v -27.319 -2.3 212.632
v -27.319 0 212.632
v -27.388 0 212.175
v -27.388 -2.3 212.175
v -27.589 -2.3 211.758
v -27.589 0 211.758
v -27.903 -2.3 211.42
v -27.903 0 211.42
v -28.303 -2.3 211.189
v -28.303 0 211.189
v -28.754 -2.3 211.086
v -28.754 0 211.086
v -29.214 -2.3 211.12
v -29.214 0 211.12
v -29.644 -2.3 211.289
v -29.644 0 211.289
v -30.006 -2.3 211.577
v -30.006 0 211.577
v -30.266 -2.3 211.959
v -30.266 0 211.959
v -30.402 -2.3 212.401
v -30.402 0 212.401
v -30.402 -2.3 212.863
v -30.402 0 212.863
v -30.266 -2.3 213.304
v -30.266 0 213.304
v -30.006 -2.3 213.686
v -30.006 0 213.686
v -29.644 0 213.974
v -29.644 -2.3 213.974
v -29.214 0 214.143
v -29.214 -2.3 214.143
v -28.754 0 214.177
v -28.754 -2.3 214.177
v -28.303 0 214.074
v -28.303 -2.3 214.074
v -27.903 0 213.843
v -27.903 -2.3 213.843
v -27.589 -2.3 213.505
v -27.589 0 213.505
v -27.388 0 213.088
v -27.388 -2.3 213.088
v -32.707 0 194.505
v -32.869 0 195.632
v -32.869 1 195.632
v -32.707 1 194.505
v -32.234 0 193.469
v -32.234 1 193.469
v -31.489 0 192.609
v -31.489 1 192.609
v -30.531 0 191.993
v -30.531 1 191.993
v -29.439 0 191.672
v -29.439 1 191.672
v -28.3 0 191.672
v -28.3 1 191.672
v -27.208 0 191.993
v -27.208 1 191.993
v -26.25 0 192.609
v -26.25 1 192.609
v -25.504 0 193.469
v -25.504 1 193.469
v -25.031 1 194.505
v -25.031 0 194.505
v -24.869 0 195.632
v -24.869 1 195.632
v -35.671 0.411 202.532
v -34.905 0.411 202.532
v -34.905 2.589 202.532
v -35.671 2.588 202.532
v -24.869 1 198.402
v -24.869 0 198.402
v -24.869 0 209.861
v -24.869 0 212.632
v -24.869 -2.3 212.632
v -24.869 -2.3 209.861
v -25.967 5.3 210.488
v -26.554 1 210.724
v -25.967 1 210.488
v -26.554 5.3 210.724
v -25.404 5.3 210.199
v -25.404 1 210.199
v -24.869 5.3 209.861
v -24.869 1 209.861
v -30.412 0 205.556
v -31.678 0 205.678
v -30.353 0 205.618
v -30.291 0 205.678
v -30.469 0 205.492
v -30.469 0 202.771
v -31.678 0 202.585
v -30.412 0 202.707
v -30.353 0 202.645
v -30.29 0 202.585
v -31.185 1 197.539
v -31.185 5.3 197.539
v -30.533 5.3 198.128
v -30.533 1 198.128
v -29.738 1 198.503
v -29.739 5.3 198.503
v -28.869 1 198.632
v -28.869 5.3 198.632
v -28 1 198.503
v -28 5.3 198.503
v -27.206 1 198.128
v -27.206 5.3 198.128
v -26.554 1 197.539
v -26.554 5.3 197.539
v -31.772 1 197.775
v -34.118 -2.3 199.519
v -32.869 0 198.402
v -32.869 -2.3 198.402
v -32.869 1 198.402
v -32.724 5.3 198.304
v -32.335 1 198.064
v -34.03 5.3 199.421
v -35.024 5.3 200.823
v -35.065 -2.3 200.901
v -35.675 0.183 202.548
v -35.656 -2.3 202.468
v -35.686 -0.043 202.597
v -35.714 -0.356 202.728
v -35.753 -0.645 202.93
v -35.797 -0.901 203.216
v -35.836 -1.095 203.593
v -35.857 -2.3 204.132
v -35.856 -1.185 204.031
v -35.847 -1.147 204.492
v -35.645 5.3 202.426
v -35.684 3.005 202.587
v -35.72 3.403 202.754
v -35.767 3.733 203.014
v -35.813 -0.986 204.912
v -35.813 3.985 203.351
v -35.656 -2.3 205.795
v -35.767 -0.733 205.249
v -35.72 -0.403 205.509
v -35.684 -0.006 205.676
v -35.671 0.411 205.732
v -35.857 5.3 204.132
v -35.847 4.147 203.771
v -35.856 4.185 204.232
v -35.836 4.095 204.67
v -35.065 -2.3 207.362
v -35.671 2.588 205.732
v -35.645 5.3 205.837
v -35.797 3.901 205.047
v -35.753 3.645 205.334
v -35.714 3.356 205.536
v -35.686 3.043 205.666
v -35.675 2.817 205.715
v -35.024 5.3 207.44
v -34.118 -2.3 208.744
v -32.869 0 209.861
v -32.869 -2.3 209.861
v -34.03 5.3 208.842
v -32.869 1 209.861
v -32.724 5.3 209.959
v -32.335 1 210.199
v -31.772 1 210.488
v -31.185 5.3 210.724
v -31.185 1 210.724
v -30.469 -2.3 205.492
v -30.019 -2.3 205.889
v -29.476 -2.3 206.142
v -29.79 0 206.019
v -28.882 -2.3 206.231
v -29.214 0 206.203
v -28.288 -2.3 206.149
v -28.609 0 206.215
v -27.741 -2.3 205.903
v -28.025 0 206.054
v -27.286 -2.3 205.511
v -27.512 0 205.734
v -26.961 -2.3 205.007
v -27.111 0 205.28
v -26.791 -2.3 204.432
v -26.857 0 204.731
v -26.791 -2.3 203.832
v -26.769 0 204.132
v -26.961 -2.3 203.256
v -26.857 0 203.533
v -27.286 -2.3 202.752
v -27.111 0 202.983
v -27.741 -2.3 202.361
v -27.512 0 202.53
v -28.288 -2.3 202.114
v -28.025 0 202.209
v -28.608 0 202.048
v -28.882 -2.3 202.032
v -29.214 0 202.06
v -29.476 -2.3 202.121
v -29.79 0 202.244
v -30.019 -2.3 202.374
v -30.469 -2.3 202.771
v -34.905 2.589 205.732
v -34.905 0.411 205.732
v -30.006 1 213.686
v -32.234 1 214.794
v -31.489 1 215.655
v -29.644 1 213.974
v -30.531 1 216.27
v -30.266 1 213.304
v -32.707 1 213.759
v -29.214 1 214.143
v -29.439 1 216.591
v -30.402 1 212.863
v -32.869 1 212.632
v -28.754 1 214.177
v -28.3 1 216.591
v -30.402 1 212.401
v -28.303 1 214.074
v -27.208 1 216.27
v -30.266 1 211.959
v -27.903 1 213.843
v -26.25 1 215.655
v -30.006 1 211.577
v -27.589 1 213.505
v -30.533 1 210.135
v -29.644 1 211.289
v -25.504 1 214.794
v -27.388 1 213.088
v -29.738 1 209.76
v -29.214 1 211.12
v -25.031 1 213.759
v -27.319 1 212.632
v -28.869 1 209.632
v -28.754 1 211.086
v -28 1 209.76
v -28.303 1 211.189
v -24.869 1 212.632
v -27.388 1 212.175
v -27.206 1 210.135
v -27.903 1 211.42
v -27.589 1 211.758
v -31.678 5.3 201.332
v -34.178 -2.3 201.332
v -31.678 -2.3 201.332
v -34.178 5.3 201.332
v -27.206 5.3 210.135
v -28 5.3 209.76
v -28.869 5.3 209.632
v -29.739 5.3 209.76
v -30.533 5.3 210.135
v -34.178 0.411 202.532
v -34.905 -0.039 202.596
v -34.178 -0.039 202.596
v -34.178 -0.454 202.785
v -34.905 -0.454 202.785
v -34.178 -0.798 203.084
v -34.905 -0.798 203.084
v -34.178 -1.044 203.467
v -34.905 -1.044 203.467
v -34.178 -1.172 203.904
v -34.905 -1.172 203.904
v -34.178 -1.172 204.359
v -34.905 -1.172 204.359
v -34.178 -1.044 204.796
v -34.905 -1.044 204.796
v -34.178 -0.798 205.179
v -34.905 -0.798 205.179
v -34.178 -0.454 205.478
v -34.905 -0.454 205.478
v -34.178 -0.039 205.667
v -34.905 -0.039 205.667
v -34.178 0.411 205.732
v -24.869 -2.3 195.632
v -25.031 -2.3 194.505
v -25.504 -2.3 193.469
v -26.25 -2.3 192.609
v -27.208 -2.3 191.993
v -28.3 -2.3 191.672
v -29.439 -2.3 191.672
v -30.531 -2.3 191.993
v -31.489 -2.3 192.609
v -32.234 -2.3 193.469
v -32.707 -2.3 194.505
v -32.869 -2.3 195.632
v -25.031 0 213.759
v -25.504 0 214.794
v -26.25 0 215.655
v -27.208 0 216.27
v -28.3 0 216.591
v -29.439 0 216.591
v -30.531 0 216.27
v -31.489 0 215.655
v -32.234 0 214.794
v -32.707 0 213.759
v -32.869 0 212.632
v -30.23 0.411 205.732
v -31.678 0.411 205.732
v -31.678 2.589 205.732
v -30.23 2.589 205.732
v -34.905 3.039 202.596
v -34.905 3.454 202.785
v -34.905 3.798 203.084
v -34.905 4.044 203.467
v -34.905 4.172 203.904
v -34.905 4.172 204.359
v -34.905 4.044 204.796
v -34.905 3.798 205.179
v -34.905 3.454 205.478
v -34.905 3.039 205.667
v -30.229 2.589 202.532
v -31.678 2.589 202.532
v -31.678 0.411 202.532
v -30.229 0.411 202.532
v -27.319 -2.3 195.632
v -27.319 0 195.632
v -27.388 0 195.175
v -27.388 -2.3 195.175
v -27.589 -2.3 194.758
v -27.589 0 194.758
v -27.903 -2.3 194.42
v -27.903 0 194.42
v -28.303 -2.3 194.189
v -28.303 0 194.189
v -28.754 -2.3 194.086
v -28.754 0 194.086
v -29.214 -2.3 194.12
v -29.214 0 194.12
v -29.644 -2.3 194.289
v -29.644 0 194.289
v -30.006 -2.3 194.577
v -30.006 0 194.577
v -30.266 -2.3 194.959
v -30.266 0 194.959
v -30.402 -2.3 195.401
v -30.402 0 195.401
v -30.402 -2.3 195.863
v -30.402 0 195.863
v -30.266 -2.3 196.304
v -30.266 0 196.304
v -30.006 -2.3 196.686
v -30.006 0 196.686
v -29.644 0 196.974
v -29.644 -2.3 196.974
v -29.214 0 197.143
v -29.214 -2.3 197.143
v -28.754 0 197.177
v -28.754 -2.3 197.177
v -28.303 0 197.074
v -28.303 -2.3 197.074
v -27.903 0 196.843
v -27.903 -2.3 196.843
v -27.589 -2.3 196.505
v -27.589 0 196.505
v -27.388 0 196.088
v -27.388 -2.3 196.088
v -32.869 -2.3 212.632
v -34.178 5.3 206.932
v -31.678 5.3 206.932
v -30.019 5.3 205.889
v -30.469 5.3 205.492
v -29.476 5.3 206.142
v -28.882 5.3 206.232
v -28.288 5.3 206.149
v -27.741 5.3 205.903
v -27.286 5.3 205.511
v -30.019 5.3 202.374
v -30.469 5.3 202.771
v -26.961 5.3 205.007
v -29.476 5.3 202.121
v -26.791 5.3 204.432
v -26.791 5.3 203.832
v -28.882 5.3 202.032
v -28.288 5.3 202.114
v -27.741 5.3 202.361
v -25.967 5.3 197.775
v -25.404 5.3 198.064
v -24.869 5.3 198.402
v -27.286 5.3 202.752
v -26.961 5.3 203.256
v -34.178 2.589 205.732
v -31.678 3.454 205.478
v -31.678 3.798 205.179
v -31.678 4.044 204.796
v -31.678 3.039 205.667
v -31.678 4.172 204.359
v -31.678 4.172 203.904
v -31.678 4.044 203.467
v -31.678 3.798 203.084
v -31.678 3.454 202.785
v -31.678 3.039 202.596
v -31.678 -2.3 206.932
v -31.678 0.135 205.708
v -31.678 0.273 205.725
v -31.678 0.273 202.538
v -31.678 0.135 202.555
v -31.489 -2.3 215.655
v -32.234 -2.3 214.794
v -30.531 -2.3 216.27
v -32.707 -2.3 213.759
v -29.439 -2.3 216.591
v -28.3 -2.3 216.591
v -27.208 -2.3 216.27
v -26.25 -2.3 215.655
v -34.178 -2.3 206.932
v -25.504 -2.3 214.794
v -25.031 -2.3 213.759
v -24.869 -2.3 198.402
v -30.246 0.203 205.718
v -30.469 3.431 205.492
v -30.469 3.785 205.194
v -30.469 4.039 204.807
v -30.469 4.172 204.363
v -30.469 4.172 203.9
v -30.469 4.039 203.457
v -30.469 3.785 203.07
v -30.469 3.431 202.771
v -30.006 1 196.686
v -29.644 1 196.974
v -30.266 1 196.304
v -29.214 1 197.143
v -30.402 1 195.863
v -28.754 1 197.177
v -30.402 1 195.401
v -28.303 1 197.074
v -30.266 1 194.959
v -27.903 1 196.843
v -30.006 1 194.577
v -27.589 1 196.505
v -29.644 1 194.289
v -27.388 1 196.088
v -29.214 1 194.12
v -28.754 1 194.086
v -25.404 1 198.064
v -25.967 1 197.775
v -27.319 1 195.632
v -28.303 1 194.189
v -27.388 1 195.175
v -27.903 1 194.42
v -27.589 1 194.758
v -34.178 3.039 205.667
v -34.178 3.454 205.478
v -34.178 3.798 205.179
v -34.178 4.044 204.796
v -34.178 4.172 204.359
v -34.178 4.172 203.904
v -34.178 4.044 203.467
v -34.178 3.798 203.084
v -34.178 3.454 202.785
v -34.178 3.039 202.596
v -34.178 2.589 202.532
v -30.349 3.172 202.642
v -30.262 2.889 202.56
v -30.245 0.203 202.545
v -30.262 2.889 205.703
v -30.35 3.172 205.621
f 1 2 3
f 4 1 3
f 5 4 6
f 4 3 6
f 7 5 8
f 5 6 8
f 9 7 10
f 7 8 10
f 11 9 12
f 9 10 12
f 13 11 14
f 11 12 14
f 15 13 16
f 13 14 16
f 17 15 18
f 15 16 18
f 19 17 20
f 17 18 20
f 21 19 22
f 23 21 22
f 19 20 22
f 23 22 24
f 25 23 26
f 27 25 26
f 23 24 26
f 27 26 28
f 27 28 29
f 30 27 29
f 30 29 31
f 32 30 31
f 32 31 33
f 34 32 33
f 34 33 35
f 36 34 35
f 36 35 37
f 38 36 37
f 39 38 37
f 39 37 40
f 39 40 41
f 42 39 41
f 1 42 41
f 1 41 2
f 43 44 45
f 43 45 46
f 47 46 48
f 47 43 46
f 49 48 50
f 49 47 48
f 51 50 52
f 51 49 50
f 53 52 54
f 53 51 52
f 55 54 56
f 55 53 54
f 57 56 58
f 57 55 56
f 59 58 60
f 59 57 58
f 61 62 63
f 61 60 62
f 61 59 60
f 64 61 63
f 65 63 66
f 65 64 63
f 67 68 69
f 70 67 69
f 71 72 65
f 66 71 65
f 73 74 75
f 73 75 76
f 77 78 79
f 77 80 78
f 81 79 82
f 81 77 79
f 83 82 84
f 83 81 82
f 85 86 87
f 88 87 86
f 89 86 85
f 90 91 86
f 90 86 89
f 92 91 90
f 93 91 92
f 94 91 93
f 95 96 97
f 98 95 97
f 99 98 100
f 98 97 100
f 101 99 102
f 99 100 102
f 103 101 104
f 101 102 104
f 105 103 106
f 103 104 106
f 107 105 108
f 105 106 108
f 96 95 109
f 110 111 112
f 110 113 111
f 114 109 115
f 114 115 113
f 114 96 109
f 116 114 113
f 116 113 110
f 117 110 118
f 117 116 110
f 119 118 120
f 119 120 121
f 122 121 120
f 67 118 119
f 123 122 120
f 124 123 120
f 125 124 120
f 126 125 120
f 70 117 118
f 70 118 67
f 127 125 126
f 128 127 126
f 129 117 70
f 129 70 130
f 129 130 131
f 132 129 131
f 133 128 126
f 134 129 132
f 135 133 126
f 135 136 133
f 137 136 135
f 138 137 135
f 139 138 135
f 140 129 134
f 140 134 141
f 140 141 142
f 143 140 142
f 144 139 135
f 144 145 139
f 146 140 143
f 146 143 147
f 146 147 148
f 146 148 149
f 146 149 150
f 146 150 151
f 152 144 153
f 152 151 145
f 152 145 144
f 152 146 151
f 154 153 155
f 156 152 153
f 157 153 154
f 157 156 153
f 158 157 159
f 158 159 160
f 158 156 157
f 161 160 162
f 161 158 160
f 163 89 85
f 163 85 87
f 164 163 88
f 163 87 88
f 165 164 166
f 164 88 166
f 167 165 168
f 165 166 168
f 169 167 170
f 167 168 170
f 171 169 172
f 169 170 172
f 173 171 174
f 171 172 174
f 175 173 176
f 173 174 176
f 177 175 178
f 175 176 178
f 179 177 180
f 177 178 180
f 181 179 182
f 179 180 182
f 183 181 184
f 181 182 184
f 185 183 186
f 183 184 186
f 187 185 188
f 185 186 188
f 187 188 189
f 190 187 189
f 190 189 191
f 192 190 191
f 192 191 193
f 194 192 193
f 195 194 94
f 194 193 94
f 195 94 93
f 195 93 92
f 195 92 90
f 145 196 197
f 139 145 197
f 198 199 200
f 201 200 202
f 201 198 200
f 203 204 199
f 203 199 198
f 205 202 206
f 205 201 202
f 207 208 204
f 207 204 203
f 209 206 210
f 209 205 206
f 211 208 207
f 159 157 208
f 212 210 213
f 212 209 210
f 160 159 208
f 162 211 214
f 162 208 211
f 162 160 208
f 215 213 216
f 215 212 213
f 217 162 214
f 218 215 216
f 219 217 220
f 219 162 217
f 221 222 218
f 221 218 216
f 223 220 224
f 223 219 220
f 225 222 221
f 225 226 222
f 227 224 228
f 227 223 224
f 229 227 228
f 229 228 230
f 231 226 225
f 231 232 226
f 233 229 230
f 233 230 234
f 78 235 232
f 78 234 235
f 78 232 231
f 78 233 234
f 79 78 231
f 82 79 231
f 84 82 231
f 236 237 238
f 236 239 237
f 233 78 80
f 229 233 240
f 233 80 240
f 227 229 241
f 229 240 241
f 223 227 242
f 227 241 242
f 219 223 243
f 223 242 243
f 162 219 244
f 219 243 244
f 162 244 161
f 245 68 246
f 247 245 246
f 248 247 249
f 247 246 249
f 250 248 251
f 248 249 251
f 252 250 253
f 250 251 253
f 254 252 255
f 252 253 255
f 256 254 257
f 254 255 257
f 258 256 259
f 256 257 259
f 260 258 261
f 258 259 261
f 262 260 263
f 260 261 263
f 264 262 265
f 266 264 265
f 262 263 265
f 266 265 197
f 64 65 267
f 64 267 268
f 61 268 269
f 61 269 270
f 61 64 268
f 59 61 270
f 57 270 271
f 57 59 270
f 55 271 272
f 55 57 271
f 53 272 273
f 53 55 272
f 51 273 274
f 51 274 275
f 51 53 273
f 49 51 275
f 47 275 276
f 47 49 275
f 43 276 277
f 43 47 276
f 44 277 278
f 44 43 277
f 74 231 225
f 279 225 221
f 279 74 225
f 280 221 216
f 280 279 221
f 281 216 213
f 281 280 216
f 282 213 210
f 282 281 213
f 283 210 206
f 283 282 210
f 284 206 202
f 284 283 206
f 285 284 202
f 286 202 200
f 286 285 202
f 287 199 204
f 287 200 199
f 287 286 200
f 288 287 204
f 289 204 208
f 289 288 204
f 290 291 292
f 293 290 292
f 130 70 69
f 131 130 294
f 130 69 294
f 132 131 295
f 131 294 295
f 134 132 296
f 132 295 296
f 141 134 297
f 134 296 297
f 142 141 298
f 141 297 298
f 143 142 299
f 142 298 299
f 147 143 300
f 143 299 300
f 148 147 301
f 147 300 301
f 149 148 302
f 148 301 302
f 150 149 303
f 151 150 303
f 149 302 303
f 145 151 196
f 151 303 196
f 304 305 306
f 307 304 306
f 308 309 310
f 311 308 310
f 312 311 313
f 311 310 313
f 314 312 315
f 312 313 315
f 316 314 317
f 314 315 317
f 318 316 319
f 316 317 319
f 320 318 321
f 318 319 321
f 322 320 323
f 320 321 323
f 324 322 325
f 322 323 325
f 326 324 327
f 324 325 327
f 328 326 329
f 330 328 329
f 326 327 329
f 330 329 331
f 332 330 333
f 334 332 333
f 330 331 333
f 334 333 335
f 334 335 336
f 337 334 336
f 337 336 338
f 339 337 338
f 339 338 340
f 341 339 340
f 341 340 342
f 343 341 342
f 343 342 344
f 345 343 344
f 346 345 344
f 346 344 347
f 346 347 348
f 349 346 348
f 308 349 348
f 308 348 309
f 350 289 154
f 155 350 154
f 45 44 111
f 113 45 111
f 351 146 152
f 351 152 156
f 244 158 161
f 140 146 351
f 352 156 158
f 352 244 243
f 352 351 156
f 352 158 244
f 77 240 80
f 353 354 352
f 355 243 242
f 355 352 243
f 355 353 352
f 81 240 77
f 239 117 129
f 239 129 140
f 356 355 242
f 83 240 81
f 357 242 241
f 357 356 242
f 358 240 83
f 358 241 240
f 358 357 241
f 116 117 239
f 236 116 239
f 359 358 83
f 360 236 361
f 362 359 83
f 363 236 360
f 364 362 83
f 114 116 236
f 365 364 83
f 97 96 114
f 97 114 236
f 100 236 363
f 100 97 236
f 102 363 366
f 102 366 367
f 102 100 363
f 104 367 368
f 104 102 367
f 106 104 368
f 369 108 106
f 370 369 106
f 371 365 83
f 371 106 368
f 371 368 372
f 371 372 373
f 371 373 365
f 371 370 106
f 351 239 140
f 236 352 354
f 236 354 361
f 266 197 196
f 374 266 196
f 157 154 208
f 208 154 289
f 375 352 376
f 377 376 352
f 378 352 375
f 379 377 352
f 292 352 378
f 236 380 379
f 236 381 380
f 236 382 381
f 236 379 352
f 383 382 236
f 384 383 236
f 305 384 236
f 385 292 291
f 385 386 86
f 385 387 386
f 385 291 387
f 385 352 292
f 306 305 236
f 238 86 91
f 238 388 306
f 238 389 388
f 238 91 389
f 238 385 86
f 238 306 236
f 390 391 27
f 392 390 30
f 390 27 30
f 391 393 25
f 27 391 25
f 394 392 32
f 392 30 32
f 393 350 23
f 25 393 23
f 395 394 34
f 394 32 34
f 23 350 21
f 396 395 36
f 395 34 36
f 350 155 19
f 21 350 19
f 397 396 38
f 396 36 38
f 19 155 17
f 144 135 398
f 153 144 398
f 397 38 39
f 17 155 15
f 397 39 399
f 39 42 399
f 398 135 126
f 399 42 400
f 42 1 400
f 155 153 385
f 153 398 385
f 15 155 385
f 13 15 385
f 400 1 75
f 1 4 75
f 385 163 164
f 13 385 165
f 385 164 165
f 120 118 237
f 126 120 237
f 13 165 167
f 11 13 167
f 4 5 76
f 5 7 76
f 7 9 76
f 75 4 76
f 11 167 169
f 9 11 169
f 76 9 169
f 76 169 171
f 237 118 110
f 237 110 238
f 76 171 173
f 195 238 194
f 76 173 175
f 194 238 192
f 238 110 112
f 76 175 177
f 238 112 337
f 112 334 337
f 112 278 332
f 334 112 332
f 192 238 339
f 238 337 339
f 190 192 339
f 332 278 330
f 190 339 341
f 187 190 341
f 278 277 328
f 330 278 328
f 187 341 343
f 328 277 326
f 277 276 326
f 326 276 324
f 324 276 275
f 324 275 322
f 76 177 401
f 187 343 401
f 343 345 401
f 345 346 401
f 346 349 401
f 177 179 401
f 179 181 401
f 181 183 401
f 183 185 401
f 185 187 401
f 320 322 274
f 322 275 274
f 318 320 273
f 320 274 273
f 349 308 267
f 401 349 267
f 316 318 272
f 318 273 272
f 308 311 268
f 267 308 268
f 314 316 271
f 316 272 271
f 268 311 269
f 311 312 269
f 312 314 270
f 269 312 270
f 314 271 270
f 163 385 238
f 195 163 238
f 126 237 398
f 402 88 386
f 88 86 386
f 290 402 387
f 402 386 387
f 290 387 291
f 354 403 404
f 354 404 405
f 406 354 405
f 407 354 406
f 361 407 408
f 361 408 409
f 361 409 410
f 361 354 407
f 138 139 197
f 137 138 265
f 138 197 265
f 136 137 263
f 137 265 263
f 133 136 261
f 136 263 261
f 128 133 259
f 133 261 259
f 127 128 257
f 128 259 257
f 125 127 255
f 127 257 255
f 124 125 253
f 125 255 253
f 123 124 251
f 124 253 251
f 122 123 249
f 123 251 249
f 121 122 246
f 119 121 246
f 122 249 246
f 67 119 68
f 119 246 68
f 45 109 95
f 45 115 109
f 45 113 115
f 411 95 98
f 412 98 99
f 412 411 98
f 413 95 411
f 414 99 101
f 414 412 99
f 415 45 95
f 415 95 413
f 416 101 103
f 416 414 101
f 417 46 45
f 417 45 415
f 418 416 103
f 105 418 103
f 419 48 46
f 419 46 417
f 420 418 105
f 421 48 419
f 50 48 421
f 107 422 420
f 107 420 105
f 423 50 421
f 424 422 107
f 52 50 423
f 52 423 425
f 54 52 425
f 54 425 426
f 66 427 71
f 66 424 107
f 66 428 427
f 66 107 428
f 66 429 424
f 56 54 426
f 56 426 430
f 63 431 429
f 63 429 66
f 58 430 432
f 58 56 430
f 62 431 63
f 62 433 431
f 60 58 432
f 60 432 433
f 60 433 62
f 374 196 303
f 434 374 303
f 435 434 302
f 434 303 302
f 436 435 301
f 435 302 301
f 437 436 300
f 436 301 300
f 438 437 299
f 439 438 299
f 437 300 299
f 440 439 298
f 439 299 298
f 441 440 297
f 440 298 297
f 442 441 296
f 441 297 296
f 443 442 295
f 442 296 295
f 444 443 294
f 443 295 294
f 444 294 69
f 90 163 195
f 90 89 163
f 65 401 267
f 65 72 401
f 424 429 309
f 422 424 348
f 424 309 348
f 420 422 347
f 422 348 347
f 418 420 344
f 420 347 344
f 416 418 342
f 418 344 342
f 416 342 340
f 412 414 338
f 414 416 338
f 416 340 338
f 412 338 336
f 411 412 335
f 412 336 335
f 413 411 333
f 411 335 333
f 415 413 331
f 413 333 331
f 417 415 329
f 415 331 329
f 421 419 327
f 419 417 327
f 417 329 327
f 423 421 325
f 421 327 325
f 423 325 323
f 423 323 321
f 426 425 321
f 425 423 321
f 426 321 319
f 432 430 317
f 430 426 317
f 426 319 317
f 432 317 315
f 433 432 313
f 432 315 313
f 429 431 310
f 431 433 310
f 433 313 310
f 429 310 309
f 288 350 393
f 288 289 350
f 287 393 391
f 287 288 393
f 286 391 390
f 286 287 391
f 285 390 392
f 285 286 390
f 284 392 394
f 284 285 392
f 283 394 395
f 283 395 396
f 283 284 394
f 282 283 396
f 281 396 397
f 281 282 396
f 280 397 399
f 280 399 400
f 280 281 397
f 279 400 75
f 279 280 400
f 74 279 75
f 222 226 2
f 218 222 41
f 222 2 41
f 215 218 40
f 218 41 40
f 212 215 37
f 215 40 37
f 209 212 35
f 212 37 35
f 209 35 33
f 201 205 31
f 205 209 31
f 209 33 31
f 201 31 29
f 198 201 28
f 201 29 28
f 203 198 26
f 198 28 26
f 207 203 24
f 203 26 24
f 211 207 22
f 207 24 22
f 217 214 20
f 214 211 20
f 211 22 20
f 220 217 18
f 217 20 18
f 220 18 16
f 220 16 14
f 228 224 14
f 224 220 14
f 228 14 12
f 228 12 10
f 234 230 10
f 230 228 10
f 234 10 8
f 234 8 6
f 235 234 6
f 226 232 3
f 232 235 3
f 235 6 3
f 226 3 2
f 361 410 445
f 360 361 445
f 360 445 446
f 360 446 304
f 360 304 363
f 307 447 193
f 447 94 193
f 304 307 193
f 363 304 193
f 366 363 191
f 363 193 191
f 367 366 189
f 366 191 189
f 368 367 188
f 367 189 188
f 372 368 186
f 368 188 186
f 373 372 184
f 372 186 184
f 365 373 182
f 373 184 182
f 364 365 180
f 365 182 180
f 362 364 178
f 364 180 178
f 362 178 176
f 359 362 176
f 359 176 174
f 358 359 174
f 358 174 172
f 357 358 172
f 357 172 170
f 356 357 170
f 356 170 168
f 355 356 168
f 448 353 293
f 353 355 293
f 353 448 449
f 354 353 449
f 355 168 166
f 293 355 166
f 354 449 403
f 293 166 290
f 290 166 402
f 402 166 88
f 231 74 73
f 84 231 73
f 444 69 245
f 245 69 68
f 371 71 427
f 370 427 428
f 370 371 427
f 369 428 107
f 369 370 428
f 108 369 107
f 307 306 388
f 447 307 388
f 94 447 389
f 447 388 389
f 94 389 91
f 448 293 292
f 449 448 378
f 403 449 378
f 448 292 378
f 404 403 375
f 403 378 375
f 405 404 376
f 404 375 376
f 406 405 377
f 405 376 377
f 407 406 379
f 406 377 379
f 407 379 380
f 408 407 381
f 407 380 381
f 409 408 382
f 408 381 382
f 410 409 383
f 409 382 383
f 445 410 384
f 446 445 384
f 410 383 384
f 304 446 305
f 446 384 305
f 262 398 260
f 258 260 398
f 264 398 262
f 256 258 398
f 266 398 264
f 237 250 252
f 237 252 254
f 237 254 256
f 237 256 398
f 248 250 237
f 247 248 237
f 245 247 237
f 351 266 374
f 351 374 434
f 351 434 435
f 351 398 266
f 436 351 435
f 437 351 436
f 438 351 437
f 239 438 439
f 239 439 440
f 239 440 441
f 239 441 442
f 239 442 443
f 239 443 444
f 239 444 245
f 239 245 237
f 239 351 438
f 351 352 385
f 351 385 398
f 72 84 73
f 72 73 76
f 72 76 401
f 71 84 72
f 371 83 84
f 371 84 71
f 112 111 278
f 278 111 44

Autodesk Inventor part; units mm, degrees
ref_plane "YZ Plane" through (0, 0, 0) normal (1, 0, 0) x (0, 1, 0)
ref_plane "XZ Plane" through (0, 0, 0) normal (0, 1, 0) x (-1, 0, 0)
ref_plane "XY Plane" through (0, 0, 0) normal (0, 0, 1) x (1, 0, 0)
sketch "Sketch1" plane through (0, 0, 0) normal (0, 1, 0) x (-1, 0, 0)
  line L0 (31.678, 204.1316) -> (31.678, 201.3316)
  line L1 (31.678, 201.3316) -> (31.678, 206.9316)
  circle A0 centre (28.8694, 204.1316) radius 2.1
  line L2 (26.7694, 204.1316) -> (30.3694, 204.1316)
  line L3 (30.3694, 204.1316) -> (30.3694, 202.6619)
  line L4 (30.3694, 202.6619) -> (30.3694, 205.6012)
  line L5 (30.3694, 204.1316) -> (31.678, 204.1316)
  line L6 (31.678, 201.3316) -> (34.178, 201.3316)
  line L7 (34.178, 201.3316) -> (34.178, 206.9316)
  line L8 (34.178, 206.9316) -> (31.678, 206.9316)
  line L9 (31.678, 206.9316) -> (31.678, 201.3316)
  circle A1 centre (28.8694, 204.1316) radius 8.5
  circle A2 centre (28.8694, 212.6316) radius 1.55
  circle A3 centre (28.8694, 195.6316) radius 1.55
  line L10 (22.8334, 207.9209) -> (34.9053, 207.9209)
  line L11 (34.9053, 207.9209) -> (34.9053, 200.3422)
  line L12 (34.9053, 200.3422) -> (22.8334, 200.3422)
  line L13 (22.8334, 200.3422) -> (22.8334, 207.9209)
  line L14 (22.8334, 207.9209) -> (34.9053, 200.3422) construction
  line L15 (34.9053, 207.9209) -> (22.8334, 200.3422) construction
  line L16 (22.8334, 200.3422) -> (25.8027, 200.3422)
  line L17 (25.8027, 200.3422) -> (25.8027, 207.9209)
  line L18 (25.8027, 207.9209) -> (22.8334, 207.9209)
  line L19 (22.8334, 207.9209) -> (22.8334, 200.3422)
  dimension "d1" = 2.8
  dimension "d2" = 5.6
  dimension "d3" = 4.2
  dimension "d5" = 2.5
  dimension "d6" = 17
  dimension "d7" = 3.1
  dimension "d8" = 3.1
extrude "Extrusion1" add sketch "Sketch1" along normal blind 7 contours L10 L11 L12 L17
sketch "Sketch2" plane through (0, 0, 0) normal (0, -1, 0) x (1, 0, 0)
  point P0 (0, 0)
sketch "Sketch3" plane through (0, 0, 0) normal (0, -1, 0) x (1, 0, 0)
  circle A0 centre (-28.8694, 204.1316) radius 2.1 projected
  circle A1 centre (-28.8694, 204.1316) radius 8.5
  circle A2 centre (-28.8694, 212.6316) radius 1.55
  circle A3 centre (-28.8694, 195.6316) radius 1.55
  circle A4 centre (-28.8694, 212.6316) radius 3
  circle A5 centre (-28.8694, 195.6316) radius 3
  line L0 (-31.8694, 212.6316) -> (-31.8694, 195.6316)
  line L1 (-25.8694, 195.6316) -> (-25.8694, 212.6316)
  point P0 (0, 0)
  point P1 (-25.9164, 212.1021)
  point P2 (-31.8223, 212.1021)
  point P3 (-31.8694, 212.0845)
  point P4 (-31.8694, 196.1786)
  point P5 (-31.8223, 196.161)
  point P6 (-25.9164, 196.161)
  point P7 (-25.8694, 196.1786)
  point P8 (-25.8694, 212.0845)
  dimension "d11" = 17
  dimension "d12" = 3.1
  dimension "d13" = 3.1
  dimension "d14" = 6
  dimension "d15" = 6
extrude "Extrusion4" add sketch "Sketch3" along normal blind 2.3 contours L1 A1 A5 L0 A4 | A1 A4 L1 | L1 A5 A1 | A4 A1 A2 | A1 A2 A4 | A5 A1 A3 | A1 A3 A5 | A1 L0 A4 | A5 L0 A1
sketch "Sketch5" plane through (0, 0, 0) normal (0, -1, 0) x (1, 0, 0)
  line L0 (-34.9053, 207.9209) -> (-25.8027, 207.9209) projected
  line L1 (-31.8694, 200.3422) -> (-31.8694, 201.3316) projected
  line L2 (-34.9053, 207.9209) -> (-31.8694, 207.9209)
  line L3 (-31.8694, 207.9209) -> (-31.8694, 200.3422)
  line L4 (-31.8694, 200.3422) -> (-34.9053, 200.3422)
  line L5 (-34.9053, 200.3422) -> (-34.9053, 207.9209)
  line L6 (-34.178, 201.3316) -> (-31.678, 201.3316) projected
  line L7 (-31.678, 206.9316) -> (-34.178, 206.9316) projected
  line L8 (-34.178, 201.3316) -> (-31.8694, 201.3316)
  line L9 (-31.8694, 201.3316) -> (-31.8694, 206.9316)
  line L10 (-31.8694, 206.9316) -> (-34.178, 206.9316)
  line L11 (-34.178, 206.9316) -> (-34.178, 201.3316)
  point P0 (0, 0)
extrude "Extrusion5" add sketch "Sketch5" along normal blind 2.3 contours L0 L3 L7 L11 L6 L1 L4 L5
sketch "Sketch6" plane through (-25.8694, 0, 200.3422) normal (1, 0, 0) x (0, 0, -1)
  line L0 (-9.2808, 8.2816) -> (1.9224, 8.2816)
  line L1 (1.9224, 8.2816) -> (1.9224, -4.0318)
  line L2 (1.9224, -4.0318) -> (-9.2808, -4.0318)
  line L3 (-9.2808, -4.0318) -> (-9.2808, 8.2816)
  point P0 (200.3422, 0)
extrude "Extrusion6" cut sketch "Sketch6" along normal blind 2.3
sketch "Sketch7" plane through (-25.8694, 0, 212.6316) normal (1, 0, 0) x (0, 0, -1)
  point P0 (212.6316, 0)
sketch "Sketch8" plane through (0, 7, 0) normal (0, 1, 0) x (1, 0, 0)
  line L0 (-31.678, -201.3316) -> (-31.678, -206.9316) projected
  line L1 (-31.678, -206.9316) -> (-34.178, -206.9316) projected
  line L2 (-34.178, -206.9316) -> (-34.178, -201.3316) projected
  line L3 (-34.178, -201.3316) -> (-31.678, -201.3316) projected
  circle A0 centre (-28.8694, -204.1316) radius 2.1 projected
  line L4 (-25.8694, -207.9209) -> (-25.8694, -200.3422) projected
  line L5 (-25.8694, -200.3422) -> (-34.9053, -200.3422) projected
  line L6 (-34.9053, -200.3422) -> (-34.9053, -207.9209) projected
  line L7 (-34.9053, -207.9209) -> (-25.8694, -207.9209) projected
  point P0 (0, 0)
extrude "Extrusion7" cut sketch "Sketch8" against normal blind 1.7
sketch "Sketch9" plane through (0, 5.3, 0) normal (0, 1, 0) x (1, 0, 0)
  line L0 (-31.678, -201.3316) -> (-31.678, -206.9316) projected
  line L1 (-34.178, -206.9316) -> (-31.8694, -206.9316) projected
  line L2 (-31.678, -201.3316) -> (-34.178, -201.3316)
  line L3 (-34.178, -201.3316) -> (-34.178, -206.9316)
  line L4 (-34.178, -206.9316) -> (-31.678, -206.9316)
  line L5 (-31.678, -206.9316) -> (-31.678, -201.3316)
  point P0 (0, 0)
extrude "Extrusion8" cut sketch "Sketch9" against normal through all
sketch "Sketch10" plane through (-34.9053, -2.3, 200.3422) normal (-1, 0, 0) x (0, 0, 1)
  line L0 (6.5893, 7.6) -> (0.9893, 7.6) projected
  line L1 (3.7893, 7.6) -> (3.7893, 0)
  line L2 (5.8893, 0) -> (1.6893, 0) projected
  line L3 (3.7893, 2.0731) -> (3.7893, 5.5269) construction
  line L4 (3.7893, 3.8) -> (3.7893, 2.7114)
  line L5 (3.7893, 4.8886) -> (3.7893, 2.7114) construction
  line L6 (2.1893, 4.8886) -> (2.1893, 2.7114)
  line L7 (5.3893, 2.7114) -> (5.3893, 4.8886)
  arc A0 (5.3893, 4.8886) -> (2.1893, 4.8886) centre (3.7893, 4.8886) ccw
  arc A1 (2.1893, 2.7114) -> (5.3893, 2.7114) centre (3.7893, 2.7114) ccw
  point P0 (-200.3422, 2.3)
  dimension "d39" = 3.2
fillet "Fillet1" radius 0.7 2 edges at (-34.9053, 1.5, 207.9209) (-34.9053, 1.5, 200.3422)
fillet "Fillet2" radius 1 2 edges at (-25.8694, 2.65, 207.9209) (-25.8694, 2.65, 200.3422)
sketch "Sketch11" plane through (0, 5.3, 0) normal (0, 1, 0) x (1, 0, 0)
  circle A0 centre (-28.8694, -204.1316) radius 2.1 projected
  circle A1 centre (-28.8694, -204.1316) radius 2.1
  line L0 (-26.7694, -204.1316) -> (-30.4694, -204.1316)
  line L1 (-30.4694, -204.1316) -> (-30.4694, -202.7714)
  line L2 (-30.4694, -202.7714) -> (-30.4694, -205.4917)
  point P0 (0, 0)
  dimension "d36" = 3.7
extrude "Extrusion10" add sketch "Sketch11" against normal up to surface (7.6 mm away) contours L1 L2 A0
extrude "Extrusion11" cut sketch "Sketch10" against normal blind 6
sketch "Sketch12" plane through (0, 5.3, 0) normal (0, 1, 0) x (1, 0, 0)
  circle A0 centre (-28.8694, -212.6316) radius 1.55 projected
  circle A1 centre (-28.8694, -212.6316) radius 3
  circle A2 centre (-28.8694, -195.6316) radius 1.55 projected
  circle A3 centre (-28.8694, -195.6316) radius 3
  arc A4 (-30.4694, -205.4917) -> (-30.4694, -202.7714) centre (-28.8694, -204.1316) ccw projected
  circle A5 centre (-28.8694, -204.1316) radius 6.9874
  arc A6 (-25.8694, -201.3422) -> (-26.8694, -200.3422) centre (-26.8694, -201.3422) ccw projected
  line L0 (-34.2053, -200.3422) -> (-26.8694, -200.3422) projected
  arc A7 (-34.2053, -200.3422) -> (-34.9053, -201.0422) centre (-34.2053, -201.0422) ccw projected
  line L1 (-34.9053, -207.2209) -> (-34.9053, -201.0422) projected
  arc A8 (-34.9053, -207.2209) -> (-34.2053, -207.9209) centre (-34.2053, -207.2209) ccw projected
  line L2 (-26.8694, -207.9209) -> (-34.2053, -207.9209) projected
  arc A9 (-26.8694, -207.9209) -> (-25.8694, -206.9209) centre (-26.8694, -206.9209) ccw projected
  line L3 (-25.8694, -201.3422) -> (-25.8694, -206.9209) projected
  line L4 (-31.678, -206.9316) -> (-31.678, -201.3316) projected
  line L5 (-34.178, -206.9316) -> (-31.678, -206.9316) projected
  line L6 (-34.178, -201.3316) -> (-34.178, -206.9316) projected
  line L7 (-31.678, -201.3316) -> (-34.178, -201.3316) projected
  arc A10 (-30.4694, -205.4917) -> (-30.4694, -202.7714) centre (-28.8694, -204.1316) ccw projected
  line L8 (-30.4694, -205.4917) -> (-30.4694, -202.7714) projected
  point P0 (0, 0)
  point P1 (-31.1849, -197.539)
  point P2 (-31.1849, -210.7242)
  point P3 (-26.5538, -210.7242)
  point P4 (-26.5538, -197.539)
  dimension "d42" = 6
  dimension "d43" = 6
extrude "Extrusion12" add sketch "Sketch12" against normal up to surface (7.6 mm away) contours A1 A5 A3
sketch "Sketch13" plane through (0, 0, 0) normal (0, 1, 0) x (1, 0, 0)
  circle A0 centre (-28.8694, -212.6316) radius 1.55 projected
  circle A1 centre (-28.8694, -212.6316) radius 4
  circle A2 centre (-28.8694, -195.6316) radius 1.55 projected
  circle A3 centre (-28.8694, -195.6316) radius 4
  line L0 (-32.8694, -212.6316) -> (-32.8694, -195.6316)
  line L1 (-24.8694, -212.6316) -> (-24.8694, -195.6316)
  line L2 (-31.678, -201.3316) -> (-34.178, -201.3316) projected
  line L3 (-34.178, -206.9316) -> (-31.678, -206.9316) projected
  line L4 (-31.678, -201.3316) -> (-32.928, -201.3316)
  line L5 (-32.928, -201.3316) -> (-32.928, -206.9316)
  line L6 (-32.928, -206.9316) -> (-31.678, -206.9316)
  line L7 (-31.678, -206.9316) -> (-31.678, -201.3316)
  point P0 (0, 0)
  point P1 (-32.8694, -201.3316)
  point P2 (-32.8694, -206.9316)
  dimension "d46" = 8
  dimension "d47" = 8
extrude "Extrusion13" add sketch "Sketch13" against normal up to surface (2.3 mm away) contours A1 | A1 L0 L3 L7 L2 A3 L1 | A3
sketch "Sketch14" plane through (0, 5.3, 0) normal (0, 1, 0) x (1, 0, 0)
  line L0 (-24.8694, -212.6316) -> (-24.8694, -209.8608) projected
  line L1 (-24.8694, -198.4023) -> (-24.8694, -195.6316) projected
  line L2 (-24.8694, -209.8608) -> (-24.8694, -198.4023)
  line L3 (-24.8694, -198.4023) -> (-21.4183, -198.4023)
  line L4 (-21.4183, -198.4023) -> (-21.2342, -210.9453)
  line L5 (-21.2342, -210.9453) -> (-24.8694, -209.8608)
  point P0 (0, 0)
extrude "Extrusion14" cut sketch "Sketch14" against normal through all
sketch "Sketch16" plane through (-34.9053, 0.4114, 202.5316) normal (1, 0, 0) x (0, 0, -1)
  line L0 (0, 0) -> (0, 2.1771) projected
  arc A0 (0, 2.1771) -> (-3.2, 2.1771) centre (-1.6, 2.1771) ccw projected
  line L1 (-3.2, 2.1771) -> (-3.2, 0) projected
  arc A1 (-3.2, 0) -> (0, 0) centre (-1.6, 0) ccw projected
  point P0 (202.5316, -0.4114)
extrude "Extrusion16" cut sketch "Sketch16" against normal blind 10
sketch "Sketch17" plane through (0, 0, 0) normal (0, 1, 0) x (1, 0, 0)
  arc A0 (-32.8694, -209.8608) -> (-31.1849, -210.7242) centre (-28.8694, -204.1316) ccw projected
  line L0 (-32.8694, -209.8608) -> (-32.8694, -212.6316) projected
  arc A1 (-32.8694, -212.6316) -> (-24.8694, -212.6316) centre (-28.8694, -212.6316) ccw projected
  line L1 (-24.8694, -212.6316) -> (-24.8694, -209.8608) projected
  arc A2 (-26.5538, -210.7242) -> (-24.8694, -209.8608) centre (-28.8694, -204.1316) ccw projected
  arc A3 (-26.5538, -210.7242) -> (-31.1849, -210.7242) centre (-28.8694, -212.6316) ccw projected
  circle A4 centre (-28.8694, -212.6316) radius 1.55 projected
  arc A5 (-31.1849, -197.539) -> (-32.8694, -198.4023) centre (-28.8694, -204.1316) ccw projected
  arc A6 (-31.1849, -197.539) -> (-26.5538, -197.539) centre (-28.8694, -195.6316) ccw projected
  arc A7 (-24.8694, -198.4023) -> (-26.5538, -197.539) centre (-28.8694, -204.1316) ccw projected
  line L2 (-24.8694, -198.4023) -> (-24.8694, -195.6316) projected
  arc A8 (-24.8694, -195.6316) -> (-32.8694, -195.6316) centre (-28.8694, -195.6316) ccw projected
  line L3 (-32.8694, -195.6316) -> (-32.8694, -198.4023) projected
  circle A9 centre (-28.8694, -195.6316) radius 1.55 projected
  point P0 (0, 0)
extrude "Extrusion17" add sketch "Sketch17" along normal blind 1
sketch "Sketch18" plane through (0, 0, 0) normal (0, 1, 0) x (1, 0, 0)
  line L0 (-30.2904, -205.6777) -> (-31.678, -205.6777) projected
  arc A0 (-30.2904, -205.6777) -> (-30.2904, -202.5854) centre (-28.8694, -204.1316) ccw projected
  line L1 (-31.678, -202.5854) -> (-30.2904, -202.5854) projected
  line L2 (-31.678, -202.5854) -> (-31.678, -205.6777) projected
  point P0 (0, 0)
sketch "Sketch19" plane through (0, 5.3, 0) normal (0, 1, 0) x (1, 0, 0)
  line L0 (-30.4694, -205.4917) -> (-30.4694, -202.7714) projected
  arc A0 (-30.4694, -205.4917) -> (-30.4694, -202.7714) centre (-28.8694, -204.1316) ccw projected
  point P0 (0, 0)
extrude "Extrusion18" cut sketch "Sketch19" against normal through all
sketch "Sketch20" plane through (0, 5.3, 0) normal (0, 1, 0) x (1, 0, 0)
  point P0 (0, 0)
properties part number "Acople3"
